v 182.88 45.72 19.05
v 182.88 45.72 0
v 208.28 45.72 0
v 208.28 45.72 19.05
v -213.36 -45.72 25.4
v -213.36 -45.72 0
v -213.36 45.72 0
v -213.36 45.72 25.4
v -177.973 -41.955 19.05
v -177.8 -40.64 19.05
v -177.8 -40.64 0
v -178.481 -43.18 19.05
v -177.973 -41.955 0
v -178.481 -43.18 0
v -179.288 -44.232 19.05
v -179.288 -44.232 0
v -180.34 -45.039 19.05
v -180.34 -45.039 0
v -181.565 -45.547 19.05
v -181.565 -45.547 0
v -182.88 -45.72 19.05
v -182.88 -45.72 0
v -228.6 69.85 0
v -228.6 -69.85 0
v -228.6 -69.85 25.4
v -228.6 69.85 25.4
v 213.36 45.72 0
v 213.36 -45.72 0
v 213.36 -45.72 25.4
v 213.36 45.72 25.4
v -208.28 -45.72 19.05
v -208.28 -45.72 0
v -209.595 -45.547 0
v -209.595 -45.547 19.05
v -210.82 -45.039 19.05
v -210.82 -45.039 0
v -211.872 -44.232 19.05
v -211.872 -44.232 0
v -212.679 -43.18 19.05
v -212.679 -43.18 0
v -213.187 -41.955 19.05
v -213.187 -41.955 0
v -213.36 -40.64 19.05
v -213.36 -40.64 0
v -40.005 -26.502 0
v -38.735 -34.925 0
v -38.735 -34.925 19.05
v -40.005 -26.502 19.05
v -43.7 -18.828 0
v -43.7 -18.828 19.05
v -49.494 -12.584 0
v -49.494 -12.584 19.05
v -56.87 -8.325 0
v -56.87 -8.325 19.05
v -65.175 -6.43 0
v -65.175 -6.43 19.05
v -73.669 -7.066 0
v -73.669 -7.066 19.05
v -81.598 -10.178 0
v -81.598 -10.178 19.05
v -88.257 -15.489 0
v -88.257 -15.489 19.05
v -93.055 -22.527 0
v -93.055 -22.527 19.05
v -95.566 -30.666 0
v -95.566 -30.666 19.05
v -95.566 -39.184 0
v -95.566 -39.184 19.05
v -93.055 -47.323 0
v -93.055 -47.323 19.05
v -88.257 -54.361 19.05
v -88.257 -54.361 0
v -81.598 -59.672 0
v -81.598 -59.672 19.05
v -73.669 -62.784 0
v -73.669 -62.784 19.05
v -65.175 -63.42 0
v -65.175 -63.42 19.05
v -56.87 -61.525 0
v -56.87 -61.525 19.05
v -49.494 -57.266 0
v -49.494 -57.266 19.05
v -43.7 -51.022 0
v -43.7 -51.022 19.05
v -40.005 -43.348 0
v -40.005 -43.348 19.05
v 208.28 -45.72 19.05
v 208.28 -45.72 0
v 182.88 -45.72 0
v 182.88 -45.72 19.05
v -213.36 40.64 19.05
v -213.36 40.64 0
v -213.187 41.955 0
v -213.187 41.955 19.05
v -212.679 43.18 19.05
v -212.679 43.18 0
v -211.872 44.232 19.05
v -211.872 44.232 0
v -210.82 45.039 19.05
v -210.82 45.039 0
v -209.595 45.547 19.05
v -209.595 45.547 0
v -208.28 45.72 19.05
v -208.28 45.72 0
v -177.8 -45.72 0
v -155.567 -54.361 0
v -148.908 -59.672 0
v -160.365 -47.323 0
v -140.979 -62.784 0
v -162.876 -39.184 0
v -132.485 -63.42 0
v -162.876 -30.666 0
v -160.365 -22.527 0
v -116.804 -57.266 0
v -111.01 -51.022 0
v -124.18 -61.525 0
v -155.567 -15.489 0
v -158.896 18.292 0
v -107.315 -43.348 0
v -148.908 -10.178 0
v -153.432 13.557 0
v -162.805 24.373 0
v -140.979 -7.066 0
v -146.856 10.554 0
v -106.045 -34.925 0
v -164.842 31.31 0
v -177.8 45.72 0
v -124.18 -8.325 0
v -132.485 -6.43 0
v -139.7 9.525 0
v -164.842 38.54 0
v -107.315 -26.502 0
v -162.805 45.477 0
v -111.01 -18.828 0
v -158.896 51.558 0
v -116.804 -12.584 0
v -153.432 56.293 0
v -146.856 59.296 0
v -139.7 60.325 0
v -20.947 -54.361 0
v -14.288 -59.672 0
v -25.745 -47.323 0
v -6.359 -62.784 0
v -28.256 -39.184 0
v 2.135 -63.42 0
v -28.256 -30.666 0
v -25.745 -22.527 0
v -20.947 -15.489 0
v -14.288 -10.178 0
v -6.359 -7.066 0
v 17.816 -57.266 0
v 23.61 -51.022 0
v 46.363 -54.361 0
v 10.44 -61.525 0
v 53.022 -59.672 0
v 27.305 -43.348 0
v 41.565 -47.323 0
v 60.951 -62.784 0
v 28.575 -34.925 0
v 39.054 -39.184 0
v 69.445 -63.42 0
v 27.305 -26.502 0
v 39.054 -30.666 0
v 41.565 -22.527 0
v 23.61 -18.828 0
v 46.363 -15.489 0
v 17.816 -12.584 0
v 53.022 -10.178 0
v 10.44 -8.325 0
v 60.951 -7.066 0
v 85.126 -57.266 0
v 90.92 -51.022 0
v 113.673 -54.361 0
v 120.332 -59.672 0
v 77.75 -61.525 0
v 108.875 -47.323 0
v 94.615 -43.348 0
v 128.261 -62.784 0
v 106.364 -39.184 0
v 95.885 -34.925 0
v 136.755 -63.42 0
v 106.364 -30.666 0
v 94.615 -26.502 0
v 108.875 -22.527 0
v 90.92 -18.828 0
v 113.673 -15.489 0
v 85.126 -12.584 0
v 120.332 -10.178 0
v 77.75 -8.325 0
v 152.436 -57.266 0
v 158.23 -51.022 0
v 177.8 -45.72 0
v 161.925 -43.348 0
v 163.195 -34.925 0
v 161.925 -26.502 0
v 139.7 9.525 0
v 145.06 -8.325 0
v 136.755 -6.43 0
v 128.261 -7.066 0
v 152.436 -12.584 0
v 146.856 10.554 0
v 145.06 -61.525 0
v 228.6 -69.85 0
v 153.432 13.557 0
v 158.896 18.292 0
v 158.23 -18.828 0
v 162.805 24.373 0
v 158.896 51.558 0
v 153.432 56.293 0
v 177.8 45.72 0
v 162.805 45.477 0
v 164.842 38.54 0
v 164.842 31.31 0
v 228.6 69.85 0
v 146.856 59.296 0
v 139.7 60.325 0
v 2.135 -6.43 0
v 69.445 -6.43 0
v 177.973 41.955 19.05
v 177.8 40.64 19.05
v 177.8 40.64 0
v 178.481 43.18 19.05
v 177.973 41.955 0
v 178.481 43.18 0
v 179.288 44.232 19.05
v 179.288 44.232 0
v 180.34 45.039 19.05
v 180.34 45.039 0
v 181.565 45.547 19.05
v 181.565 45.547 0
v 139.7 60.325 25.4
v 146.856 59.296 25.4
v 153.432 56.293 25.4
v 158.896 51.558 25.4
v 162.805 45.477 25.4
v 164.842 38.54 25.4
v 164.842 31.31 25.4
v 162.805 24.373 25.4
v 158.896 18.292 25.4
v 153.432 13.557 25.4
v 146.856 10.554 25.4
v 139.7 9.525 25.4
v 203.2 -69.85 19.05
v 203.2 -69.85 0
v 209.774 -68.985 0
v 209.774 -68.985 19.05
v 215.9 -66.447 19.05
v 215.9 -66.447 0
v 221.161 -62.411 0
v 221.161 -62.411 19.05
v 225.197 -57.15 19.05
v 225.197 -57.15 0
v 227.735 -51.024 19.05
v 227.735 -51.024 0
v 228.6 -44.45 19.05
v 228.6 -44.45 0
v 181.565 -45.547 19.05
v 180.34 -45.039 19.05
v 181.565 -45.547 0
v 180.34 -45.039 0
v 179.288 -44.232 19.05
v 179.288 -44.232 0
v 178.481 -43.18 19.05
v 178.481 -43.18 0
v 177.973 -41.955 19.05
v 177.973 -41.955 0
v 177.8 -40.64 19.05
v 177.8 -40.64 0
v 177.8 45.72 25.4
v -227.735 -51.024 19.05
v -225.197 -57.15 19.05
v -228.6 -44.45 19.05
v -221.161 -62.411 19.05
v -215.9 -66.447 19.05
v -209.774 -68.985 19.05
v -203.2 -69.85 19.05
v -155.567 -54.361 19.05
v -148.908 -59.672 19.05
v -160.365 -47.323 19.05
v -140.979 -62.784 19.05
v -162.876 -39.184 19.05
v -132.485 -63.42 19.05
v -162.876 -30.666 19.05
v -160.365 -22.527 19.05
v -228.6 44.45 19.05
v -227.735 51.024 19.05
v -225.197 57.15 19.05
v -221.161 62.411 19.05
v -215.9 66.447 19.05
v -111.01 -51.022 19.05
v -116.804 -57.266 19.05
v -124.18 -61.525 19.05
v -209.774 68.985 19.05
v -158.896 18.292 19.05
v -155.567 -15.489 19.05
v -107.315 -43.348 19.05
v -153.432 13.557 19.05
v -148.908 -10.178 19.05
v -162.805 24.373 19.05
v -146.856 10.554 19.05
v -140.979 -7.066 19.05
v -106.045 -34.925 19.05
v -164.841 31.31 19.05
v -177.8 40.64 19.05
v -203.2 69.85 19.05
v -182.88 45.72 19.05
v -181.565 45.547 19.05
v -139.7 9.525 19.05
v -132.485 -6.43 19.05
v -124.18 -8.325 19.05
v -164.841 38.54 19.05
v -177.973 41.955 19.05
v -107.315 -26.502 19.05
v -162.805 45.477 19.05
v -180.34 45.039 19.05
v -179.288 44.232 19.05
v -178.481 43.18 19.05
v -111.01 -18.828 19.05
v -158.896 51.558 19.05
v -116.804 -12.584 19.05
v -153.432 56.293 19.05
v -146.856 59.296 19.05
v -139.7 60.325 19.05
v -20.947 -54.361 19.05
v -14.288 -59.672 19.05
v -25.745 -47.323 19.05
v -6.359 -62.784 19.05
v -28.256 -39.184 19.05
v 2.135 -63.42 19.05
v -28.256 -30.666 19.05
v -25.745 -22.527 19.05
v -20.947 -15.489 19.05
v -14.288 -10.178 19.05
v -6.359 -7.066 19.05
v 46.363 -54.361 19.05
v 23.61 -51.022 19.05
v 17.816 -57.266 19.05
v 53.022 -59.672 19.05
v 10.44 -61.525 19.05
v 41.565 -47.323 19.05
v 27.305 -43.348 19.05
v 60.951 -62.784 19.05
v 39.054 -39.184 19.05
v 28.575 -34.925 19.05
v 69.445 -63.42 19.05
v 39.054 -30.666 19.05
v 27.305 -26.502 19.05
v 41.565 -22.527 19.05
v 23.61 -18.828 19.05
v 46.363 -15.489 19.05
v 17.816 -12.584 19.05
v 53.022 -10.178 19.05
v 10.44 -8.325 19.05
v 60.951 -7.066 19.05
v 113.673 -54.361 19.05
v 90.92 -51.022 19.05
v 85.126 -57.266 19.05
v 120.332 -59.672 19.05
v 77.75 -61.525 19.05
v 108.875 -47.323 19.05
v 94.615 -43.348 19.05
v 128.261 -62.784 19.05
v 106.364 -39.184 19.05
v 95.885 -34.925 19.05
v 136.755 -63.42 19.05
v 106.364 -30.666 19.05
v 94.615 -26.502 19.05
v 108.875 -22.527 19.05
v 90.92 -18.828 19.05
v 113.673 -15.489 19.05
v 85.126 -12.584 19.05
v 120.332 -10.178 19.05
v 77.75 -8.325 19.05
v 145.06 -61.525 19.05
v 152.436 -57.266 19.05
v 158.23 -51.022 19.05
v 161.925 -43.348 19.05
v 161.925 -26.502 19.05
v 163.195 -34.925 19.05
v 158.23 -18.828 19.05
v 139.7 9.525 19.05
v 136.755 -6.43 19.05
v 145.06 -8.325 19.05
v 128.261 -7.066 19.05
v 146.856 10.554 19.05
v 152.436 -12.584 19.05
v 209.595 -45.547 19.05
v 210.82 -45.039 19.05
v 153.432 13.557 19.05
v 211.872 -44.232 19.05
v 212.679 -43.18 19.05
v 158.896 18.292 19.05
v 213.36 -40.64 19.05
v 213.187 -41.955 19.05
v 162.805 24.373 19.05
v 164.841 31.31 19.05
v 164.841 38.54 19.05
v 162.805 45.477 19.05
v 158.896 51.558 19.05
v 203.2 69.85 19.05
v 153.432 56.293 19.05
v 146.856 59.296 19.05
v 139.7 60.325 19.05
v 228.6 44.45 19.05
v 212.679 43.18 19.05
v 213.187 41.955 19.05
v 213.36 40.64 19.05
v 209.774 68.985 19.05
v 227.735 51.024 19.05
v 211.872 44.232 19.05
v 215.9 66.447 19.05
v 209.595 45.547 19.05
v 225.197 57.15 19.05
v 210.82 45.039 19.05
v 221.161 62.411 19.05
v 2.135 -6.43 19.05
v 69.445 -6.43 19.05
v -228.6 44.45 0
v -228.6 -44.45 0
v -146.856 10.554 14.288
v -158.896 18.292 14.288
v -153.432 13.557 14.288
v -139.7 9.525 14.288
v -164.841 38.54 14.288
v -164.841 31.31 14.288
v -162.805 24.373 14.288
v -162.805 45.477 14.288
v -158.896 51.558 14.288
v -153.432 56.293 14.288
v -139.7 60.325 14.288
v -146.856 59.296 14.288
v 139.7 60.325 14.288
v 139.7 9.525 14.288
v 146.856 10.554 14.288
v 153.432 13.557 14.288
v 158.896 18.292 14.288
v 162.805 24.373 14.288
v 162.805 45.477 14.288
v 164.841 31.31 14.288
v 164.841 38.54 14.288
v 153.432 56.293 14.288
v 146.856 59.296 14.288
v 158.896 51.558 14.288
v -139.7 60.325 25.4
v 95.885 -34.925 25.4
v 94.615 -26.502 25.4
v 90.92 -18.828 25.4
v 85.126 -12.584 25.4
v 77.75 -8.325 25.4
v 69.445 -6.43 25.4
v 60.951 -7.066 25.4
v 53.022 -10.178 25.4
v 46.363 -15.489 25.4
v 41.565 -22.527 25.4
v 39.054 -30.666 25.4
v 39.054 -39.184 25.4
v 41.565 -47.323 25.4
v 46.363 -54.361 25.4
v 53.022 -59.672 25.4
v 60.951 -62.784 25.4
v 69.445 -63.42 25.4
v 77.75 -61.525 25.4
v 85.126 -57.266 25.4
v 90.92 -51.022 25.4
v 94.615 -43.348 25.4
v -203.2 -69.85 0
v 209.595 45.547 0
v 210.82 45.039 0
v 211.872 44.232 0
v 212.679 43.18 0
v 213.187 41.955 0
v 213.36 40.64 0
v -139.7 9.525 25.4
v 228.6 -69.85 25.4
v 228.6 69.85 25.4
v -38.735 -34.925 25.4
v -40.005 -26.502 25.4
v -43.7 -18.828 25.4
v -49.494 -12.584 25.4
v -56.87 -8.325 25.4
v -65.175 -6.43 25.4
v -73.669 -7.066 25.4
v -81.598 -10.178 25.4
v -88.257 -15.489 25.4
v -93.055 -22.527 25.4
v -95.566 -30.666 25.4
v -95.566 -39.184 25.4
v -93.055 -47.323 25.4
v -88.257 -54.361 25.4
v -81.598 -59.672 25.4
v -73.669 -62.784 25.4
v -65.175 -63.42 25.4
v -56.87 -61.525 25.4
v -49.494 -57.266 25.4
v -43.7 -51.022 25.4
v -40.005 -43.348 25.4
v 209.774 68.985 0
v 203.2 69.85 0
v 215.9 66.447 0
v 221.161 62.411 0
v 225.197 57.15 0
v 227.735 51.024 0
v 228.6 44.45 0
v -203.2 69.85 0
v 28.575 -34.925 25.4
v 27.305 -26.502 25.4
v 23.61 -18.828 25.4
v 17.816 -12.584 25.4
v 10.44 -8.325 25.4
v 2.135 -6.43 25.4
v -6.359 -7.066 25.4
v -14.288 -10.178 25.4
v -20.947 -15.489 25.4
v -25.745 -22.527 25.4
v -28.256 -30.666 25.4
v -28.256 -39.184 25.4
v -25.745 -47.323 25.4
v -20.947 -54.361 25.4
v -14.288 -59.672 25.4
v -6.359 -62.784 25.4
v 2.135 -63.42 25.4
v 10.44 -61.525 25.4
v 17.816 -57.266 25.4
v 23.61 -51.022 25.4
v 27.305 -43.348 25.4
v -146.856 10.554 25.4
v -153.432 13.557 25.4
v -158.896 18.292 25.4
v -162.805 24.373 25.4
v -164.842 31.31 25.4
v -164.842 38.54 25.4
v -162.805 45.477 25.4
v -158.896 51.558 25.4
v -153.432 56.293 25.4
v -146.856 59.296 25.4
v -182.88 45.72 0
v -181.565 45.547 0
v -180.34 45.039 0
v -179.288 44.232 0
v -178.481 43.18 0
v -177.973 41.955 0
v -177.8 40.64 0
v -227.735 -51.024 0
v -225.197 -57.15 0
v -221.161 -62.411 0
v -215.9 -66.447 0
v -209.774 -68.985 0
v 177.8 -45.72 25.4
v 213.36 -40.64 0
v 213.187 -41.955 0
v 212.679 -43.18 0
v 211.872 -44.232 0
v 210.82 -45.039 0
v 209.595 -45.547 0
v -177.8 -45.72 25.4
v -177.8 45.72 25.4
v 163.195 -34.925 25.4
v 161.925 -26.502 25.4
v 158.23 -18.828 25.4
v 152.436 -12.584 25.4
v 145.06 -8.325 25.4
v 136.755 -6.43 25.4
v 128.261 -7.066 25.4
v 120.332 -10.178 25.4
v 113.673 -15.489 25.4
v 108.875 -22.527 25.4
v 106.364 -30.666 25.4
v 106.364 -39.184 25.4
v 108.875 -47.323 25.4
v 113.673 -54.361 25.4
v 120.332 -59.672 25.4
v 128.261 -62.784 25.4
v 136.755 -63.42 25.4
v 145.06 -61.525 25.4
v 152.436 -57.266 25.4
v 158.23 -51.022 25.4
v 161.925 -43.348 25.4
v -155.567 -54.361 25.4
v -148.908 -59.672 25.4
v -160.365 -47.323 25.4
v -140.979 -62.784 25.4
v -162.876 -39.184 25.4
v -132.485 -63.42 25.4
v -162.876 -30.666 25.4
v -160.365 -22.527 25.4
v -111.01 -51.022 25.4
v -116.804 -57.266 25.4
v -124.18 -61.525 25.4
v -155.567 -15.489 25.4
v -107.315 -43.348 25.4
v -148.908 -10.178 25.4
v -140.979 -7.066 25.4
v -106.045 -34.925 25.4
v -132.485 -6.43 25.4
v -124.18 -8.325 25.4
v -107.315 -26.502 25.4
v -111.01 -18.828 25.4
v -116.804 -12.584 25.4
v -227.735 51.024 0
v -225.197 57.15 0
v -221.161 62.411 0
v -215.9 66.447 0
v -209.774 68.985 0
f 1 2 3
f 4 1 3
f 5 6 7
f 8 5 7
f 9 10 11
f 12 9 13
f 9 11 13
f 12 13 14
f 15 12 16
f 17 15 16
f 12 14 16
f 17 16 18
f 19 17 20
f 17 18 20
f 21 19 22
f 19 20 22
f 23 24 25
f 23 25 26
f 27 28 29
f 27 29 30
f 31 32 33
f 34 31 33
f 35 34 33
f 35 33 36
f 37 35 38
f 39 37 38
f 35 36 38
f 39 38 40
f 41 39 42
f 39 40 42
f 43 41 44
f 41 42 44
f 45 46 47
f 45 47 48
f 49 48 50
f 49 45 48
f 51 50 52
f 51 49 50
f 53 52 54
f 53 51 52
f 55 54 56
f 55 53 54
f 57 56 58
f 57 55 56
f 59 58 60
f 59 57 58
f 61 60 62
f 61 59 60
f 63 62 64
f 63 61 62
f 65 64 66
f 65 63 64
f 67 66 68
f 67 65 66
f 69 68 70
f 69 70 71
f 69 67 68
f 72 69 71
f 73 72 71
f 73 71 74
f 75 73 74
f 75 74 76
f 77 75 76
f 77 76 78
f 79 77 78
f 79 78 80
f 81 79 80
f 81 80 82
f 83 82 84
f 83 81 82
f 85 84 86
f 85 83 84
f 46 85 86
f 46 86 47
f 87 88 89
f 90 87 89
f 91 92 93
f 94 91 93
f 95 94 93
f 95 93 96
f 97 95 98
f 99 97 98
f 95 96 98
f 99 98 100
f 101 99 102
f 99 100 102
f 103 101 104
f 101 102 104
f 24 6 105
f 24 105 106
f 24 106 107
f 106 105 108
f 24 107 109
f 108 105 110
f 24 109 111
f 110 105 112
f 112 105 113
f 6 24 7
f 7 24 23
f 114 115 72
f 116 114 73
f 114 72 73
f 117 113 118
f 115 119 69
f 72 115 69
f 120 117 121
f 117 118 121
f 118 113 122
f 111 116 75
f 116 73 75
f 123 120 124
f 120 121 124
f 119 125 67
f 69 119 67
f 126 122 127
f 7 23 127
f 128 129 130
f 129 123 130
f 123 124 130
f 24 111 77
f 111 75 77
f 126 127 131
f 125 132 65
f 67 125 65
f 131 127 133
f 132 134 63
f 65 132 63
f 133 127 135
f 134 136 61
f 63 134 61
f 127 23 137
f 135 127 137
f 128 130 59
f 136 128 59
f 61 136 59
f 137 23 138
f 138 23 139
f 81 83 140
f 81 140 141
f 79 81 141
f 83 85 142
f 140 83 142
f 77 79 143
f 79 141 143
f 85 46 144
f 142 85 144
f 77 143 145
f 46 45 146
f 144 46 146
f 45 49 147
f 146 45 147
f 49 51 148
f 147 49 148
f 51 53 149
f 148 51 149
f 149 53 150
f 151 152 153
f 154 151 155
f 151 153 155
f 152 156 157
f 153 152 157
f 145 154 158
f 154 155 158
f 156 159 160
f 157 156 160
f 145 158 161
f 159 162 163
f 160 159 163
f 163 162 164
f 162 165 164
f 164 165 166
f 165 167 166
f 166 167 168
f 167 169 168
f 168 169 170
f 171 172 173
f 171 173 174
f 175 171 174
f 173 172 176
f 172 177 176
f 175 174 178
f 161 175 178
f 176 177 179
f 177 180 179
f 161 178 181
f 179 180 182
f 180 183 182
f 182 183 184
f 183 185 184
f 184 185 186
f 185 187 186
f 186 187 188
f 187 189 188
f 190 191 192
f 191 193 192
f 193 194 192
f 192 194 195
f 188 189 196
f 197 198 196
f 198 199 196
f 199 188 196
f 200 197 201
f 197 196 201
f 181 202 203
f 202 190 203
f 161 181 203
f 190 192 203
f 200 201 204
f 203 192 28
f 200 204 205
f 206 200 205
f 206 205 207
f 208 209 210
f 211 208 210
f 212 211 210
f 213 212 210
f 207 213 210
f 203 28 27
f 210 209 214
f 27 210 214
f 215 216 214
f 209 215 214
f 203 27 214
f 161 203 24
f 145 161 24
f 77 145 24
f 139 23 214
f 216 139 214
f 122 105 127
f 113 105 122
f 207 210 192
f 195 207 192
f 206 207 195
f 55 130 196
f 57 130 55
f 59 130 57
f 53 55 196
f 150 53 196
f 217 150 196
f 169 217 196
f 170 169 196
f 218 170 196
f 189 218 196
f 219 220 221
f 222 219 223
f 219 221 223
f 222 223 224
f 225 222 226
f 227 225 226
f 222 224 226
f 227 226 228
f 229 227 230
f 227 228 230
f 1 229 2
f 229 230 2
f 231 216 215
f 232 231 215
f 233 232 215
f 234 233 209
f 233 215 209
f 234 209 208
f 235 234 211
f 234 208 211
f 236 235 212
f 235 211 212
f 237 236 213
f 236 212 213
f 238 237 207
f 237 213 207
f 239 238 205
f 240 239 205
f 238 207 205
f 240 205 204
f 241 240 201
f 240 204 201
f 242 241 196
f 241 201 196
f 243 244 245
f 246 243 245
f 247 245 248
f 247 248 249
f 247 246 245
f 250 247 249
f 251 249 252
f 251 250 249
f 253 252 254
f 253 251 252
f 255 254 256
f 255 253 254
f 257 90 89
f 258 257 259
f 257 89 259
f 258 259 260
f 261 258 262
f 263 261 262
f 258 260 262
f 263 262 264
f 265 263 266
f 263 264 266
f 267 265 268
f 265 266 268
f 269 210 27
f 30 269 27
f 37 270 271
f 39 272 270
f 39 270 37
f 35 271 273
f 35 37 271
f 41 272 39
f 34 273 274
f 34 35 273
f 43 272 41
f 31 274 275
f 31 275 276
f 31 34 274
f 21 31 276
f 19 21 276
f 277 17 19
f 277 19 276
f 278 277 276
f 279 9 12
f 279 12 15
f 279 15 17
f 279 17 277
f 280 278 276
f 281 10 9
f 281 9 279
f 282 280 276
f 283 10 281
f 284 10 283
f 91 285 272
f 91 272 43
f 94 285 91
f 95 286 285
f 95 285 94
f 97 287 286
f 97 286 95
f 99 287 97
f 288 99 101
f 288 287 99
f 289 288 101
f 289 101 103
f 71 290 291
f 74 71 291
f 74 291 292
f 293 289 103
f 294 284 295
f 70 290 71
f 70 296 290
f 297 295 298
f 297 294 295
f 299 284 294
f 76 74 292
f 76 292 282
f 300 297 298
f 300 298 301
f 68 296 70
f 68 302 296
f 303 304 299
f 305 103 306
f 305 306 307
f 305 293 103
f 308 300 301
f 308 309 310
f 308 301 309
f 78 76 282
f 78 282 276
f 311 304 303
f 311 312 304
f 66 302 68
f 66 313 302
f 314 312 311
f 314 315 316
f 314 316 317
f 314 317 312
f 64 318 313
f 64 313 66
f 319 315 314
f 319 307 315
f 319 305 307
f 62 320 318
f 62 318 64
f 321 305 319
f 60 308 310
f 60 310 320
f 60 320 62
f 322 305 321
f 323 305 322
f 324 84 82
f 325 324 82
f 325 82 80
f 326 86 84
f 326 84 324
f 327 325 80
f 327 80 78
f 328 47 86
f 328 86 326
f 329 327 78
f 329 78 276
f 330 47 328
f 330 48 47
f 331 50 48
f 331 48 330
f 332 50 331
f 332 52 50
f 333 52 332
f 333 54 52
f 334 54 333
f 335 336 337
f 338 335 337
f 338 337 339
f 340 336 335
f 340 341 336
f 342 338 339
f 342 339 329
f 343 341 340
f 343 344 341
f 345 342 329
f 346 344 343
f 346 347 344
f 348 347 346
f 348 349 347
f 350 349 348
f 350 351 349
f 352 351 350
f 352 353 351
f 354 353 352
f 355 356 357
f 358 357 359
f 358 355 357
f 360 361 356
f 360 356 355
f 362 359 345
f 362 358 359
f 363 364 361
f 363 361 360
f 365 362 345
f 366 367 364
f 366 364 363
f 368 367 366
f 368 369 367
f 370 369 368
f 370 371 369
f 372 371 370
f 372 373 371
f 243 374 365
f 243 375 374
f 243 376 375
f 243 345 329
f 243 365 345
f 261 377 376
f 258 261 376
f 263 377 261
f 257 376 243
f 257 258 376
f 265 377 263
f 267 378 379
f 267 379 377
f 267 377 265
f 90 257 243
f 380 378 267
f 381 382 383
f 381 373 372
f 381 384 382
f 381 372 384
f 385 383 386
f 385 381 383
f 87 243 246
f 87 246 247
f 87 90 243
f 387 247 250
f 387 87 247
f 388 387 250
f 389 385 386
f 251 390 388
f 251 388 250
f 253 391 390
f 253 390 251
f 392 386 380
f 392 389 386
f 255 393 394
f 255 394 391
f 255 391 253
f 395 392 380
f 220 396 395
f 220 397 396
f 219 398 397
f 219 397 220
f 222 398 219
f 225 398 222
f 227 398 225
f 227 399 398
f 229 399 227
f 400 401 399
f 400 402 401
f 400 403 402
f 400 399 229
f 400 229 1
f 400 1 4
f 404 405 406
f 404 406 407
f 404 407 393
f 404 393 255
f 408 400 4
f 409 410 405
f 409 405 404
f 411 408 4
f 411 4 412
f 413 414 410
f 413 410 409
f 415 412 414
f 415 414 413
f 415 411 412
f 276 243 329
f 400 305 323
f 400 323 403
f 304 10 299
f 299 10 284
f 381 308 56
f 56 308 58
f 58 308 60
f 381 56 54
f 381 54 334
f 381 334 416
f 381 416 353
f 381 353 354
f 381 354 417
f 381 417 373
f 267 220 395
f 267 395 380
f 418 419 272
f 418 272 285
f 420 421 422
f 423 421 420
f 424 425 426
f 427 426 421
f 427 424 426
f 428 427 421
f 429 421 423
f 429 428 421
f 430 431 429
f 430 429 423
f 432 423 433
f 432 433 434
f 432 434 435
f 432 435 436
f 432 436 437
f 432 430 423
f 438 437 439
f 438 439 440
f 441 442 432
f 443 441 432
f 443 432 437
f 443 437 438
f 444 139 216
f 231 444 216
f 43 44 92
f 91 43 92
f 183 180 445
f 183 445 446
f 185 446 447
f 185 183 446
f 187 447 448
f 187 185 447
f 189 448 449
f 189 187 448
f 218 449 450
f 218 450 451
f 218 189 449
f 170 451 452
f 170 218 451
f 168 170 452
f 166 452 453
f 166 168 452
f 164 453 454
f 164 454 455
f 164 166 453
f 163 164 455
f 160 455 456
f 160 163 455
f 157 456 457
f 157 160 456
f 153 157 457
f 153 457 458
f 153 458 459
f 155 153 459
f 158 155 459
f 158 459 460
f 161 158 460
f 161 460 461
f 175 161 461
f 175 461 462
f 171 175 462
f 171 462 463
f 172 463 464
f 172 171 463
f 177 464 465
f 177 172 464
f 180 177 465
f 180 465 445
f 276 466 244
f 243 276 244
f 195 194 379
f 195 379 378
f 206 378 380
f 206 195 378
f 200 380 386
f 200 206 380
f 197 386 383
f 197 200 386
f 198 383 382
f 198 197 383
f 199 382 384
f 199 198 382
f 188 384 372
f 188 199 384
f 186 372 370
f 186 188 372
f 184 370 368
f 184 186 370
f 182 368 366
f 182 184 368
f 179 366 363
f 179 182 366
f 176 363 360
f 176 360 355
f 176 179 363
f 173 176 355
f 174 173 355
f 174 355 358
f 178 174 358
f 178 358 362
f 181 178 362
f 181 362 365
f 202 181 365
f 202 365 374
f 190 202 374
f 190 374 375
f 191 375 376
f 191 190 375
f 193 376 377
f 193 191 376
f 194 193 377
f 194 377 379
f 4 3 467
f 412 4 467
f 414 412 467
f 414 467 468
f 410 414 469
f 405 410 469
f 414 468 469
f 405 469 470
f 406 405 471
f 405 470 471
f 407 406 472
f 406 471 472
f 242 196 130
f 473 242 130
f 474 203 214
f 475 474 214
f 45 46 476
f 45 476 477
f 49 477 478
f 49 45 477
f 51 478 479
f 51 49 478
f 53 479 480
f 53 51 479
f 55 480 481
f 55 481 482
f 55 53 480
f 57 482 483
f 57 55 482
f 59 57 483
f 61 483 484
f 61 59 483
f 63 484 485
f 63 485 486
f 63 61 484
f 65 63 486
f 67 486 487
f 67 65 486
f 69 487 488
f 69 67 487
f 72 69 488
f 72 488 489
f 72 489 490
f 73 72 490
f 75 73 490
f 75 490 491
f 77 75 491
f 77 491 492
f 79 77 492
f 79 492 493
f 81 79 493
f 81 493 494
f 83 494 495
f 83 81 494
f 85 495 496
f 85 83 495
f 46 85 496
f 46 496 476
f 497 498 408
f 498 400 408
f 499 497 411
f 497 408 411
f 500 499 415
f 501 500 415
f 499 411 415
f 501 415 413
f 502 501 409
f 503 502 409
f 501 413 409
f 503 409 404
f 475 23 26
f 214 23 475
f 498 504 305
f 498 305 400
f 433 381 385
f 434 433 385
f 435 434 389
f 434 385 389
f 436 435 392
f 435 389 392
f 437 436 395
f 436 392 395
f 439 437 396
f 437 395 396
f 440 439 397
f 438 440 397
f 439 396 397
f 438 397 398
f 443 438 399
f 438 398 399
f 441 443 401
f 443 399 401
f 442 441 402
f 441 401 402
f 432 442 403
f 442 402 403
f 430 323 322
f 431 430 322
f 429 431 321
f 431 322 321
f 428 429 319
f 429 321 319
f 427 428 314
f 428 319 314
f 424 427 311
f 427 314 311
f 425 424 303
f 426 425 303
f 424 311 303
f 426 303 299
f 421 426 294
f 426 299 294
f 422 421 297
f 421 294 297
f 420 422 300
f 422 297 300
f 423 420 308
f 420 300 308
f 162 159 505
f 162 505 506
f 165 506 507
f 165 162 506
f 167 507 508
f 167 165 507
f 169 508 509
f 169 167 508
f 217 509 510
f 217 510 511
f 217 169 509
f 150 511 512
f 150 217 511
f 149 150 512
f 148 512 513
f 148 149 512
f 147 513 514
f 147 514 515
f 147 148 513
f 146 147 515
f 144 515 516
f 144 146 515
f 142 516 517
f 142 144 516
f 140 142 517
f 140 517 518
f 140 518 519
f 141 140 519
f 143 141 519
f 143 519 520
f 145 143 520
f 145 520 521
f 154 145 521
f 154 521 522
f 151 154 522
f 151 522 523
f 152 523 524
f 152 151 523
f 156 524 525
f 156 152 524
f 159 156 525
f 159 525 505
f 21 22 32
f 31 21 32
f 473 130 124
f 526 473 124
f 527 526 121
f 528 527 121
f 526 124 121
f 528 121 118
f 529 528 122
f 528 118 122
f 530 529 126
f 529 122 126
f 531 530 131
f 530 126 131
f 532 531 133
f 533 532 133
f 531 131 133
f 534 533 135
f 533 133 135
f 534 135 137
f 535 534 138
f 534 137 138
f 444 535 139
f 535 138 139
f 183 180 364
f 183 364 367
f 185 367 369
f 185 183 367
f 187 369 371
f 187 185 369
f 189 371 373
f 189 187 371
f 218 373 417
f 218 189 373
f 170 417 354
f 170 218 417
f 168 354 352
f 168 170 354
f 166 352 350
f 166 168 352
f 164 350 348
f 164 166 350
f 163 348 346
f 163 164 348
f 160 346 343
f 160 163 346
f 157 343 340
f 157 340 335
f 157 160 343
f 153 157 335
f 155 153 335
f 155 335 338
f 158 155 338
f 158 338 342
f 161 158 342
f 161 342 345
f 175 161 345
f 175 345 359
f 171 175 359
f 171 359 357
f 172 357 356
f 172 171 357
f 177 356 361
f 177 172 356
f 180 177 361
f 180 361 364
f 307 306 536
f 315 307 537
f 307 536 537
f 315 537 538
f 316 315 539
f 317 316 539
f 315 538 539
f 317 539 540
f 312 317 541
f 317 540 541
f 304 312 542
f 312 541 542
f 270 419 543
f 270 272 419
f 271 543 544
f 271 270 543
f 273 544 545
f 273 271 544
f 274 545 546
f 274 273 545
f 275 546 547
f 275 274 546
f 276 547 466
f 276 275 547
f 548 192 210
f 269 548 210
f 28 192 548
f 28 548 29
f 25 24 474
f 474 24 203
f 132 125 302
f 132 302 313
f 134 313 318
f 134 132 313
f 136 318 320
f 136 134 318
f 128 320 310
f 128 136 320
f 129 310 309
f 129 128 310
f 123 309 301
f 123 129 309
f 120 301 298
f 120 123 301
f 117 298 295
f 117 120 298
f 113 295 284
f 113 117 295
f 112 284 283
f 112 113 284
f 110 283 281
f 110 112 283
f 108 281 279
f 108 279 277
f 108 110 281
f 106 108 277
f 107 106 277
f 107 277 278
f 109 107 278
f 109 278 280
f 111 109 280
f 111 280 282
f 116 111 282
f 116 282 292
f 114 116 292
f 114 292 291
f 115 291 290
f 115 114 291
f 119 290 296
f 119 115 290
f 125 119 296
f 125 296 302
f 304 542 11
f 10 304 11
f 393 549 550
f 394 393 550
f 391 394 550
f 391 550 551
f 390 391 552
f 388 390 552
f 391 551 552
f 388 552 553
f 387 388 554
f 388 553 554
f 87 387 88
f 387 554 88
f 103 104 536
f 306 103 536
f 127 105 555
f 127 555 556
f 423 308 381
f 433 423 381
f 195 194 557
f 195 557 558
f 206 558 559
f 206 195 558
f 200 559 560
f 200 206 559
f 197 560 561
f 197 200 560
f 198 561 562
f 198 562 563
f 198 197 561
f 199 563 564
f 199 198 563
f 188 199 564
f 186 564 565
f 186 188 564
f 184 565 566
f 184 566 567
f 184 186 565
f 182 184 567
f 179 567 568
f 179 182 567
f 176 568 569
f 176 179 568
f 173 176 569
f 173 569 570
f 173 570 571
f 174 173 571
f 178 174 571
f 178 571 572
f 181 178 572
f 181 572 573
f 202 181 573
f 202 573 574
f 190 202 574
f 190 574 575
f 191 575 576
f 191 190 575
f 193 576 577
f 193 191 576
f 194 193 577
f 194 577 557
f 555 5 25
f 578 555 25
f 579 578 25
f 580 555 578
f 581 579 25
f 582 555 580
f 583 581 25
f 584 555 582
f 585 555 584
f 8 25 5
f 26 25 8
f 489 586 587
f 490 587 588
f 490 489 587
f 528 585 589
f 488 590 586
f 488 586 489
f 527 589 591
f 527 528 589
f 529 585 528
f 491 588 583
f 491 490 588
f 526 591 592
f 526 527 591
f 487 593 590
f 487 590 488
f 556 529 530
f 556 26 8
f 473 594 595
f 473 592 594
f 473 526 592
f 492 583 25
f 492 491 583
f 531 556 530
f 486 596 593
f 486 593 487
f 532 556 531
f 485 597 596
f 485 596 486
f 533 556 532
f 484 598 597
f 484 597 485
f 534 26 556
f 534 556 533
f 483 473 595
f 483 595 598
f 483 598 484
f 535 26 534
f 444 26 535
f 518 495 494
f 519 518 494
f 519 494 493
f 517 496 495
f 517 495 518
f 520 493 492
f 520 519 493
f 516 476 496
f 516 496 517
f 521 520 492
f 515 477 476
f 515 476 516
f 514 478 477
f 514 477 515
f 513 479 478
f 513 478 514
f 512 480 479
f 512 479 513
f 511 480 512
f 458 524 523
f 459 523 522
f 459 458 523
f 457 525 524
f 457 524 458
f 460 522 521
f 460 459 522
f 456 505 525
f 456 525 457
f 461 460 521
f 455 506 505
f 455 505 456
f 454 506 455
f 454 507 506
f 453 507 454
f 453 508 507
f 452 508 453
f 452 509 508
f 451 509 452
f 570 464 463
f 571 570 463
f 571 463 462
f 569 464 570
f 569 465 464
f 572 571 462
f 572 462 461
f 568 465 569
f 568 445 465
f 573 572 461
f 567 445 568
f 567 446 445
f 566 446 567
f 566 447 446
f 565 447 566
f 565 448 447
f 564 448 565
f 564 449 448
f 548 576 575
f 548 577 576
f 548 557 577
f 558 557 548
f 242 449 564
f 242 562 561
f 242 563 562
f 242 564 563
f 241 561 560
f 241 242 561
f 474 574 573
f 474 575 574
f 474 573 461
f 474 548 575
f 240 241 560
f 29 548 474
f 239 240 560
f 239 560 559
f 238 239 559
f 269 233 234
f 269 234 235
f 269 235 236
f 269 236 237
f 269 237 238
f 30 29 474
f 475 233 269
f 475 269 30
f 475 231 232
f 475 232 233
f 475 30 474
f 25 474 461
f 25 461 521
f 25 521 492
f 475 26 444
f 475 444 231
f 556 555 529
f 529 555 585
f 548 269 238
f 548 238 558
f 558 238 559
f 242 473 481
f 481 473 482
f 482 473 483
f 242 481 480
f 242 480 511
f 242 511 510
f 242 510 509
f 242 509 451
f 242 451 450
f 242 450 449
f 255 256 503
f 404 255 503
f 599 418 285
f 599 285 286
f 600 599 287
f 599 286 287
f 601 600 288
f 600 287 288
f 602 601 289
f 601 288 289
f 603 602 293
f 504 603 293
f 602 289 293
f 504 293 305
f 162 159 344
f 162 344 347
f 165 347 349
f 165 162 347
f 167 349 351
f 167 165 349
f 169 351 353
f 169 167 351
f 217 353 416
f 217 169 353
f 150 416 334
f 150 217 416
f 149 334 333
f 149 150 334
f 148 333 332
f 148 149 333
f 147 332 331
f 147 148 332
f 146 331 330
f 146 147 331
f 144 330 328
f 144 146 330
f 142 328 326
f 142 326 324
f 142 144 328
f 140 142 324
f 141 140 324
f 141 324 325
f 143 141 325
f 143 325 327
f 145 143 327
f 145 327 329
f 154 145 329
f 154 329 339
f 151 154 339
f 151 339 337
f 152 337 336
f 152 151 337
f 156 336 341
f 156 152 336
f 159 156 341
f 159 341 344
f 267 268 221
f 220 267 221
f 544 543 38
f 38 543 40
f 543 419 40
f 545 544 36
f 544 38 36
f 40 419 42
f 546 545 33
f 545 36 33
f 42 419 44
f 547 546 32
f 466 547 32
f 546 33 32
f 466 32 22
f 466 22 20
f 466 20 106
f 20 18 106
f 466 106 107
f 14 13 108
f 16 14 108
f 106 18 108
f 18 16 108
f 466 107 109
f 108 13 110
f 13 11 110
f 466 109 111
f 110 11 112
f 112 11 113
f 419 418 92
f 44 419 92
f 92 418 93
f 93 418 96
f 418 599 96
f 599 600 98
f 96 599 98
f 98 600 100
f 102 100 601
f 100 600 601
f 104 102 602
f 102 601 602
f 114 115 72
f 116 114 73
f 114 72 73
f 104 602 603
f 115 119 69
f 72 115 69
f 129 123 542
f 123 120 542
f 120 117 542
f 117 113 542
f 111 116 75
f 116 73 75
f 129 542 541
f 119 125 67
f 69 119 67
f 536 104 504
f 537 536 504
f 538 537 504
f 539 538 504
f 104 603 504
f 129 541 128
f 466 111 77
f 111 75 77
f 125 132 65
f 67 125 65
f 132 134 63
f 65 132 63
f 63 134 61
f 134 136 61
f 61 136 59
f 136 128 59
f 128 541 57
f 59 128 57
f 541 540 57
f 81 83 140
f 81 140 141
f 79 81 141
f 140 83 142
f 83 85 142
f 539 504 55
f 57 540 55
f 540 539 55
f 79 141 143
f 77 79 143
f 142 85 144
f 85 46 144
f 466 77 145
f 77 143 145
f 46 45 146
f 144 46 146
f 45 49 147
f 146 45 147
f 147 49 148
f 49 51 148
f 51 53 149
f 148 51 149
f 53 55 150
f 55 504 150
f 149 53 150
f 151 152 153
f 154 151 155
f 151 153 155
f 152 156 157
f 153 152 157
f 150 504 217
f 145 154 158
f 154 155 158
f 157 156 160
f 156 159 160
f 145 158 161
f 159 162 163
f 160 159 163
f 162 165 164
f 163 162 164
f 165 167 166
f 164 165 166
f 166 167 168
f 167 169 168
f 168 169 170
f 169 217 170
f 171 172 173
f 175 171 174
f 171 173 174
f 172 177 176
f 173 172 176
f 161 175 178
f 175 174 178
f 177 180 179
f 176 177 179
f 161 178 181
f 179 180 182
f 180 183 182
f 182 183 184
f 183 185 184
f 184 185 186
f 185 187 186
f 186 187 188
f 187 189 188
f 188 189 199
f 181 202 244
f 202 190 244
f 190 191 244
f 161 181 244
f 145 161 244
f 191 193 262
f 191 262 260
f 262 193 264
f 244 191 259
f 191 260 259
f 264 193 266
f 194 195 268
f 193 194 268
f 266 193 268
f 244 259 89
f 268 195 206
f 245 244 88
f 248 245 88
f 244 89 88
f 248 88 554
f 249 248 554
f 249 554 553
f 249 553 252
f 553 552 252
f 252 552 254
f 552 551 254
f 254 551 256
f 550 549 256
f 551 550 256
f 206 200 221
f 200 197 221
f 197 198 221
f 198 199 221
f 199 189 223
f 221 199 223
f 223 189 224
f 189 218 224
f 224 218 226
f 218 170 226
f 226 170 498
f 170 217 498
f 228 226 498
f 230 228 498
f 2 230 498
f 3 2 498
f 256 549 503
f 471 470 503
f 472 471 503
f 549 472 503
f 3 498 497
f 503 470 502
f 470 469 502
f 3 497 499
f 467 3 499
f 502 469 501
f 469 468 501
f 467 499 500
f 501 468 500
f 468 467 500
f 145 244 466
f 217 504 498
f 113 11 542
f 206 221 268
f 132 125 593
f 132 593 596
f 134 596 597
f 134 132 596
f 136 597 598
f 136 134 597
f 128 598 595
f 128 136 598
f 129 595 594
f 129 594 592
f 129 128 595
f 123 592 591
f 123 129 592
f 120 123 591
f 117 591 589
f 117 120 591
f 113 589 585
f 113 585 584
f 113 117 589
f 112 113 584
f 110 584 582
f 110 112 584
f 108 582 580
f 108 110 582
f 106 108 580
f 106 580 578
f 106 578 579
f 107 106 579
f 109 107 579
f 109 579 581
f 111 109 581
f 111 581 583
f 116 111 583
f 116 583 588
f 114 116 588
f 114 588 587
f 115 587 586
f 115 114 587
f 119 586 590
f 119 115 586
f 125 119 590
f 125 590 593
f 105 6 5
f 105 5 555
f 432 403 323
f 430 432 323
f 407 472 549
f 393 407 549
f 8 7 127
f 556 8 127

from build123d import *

# Parameters (mm, degrees)
F0_W     = 457.2
F0_H     = 139.7
F0_R     = 28.575
F0_W_2   = 35.56
F0_H_2   = 91.44
F1_DEPTH = 25.4
F2_W     = 457.2
F2_H     = 139.7
F2_R     = 28.575
F3_DEPTH = 19.05
F5_DEPTH = 4.7625
F6_R     = 25.4


with BuildPart() as f1:
    # F0 (on Top) → F1 (new body)
    with BuildSketch(Plane.XY):
        Rectangle(F0_W, F0_H)
        with Locations((-134.62, -34.925)):
            Circle(F0_R, mode=Mode.SUBTRACT)
        with Locations((-67.31, -34.925)):
            Circle(F0_R, mode=Mode.SUBTRACT)
        with Locations((0, -34.925)):
            Circle(F0_R, mode=Mode.SUBTRACT)
        with Locations((67.31, -34.925)):
            Circle(F0_R, mode=Mode.SUBTRACT)
        with Locations((134.62, -34.925)):
            Circle(F0_R, mode=Mode.SUBTRACT)
        with Locations((-195.58, 0)):
            Rectangle(F0_W_2, F0_H_2, mode=Mode.SUBTRACT)
        with Locations((195.58, 0)):
            Rectangle(F0_W_2, F0_H_2, mode=Mode.SUBTRACT)
        with BuildLine():
            ThreePointArc((139.7, 60.325), (165.100056, 34.9250275), (139.700055, 9.525))
            Line((139.700055, 9.525), (-139.700054, 9.525))
            ThreePointArc((-139.700054, 9.525), (-165.100056, 34.925027), (-139.7, 60.325))
            Line((-139.7, 60.325), (139.7, 60.325))
        make_face(mode=Mode.SUBTRACT)
    extrude(amount=F1_DEPTH)


with BuildPart() as f3:
    # F2 (on Top) → F3 (new body)
    with BuildSketch(Plane.XY):
        Rectangle(F2_W, F2_H)
        with Locations((-134.62, -34.925)):
            Circle(F2_R, mode=Mode.SUBTRACT)
        with Locations((-67.31, -34.925)):
            Circle(F2_R, mode=Mode.SUBTRACT)
        with Locations((0, -34.925)):
            Circle(F2_R, mode=Mode.SUBTRACT)
        with Locations((67.31, -34.925)):
            Circle(F2_R, mode=Mode.SUBTRACT)
        with Locations((134.62, -34.925)):
            Circle(F2_R, mode=Mode.SUBTRACT)
        with BuildLine():
            ThreePointArc((-177.8, -40.64), (-179.2878975516, -44.2321024484), (-182.88, -45.72))
            Line((-182.88, -45.72), (-208.28, -45.72))
            ThreePointArc((-208.28, -45.72), (-211.8721024484, -44.2321024484), (-213.36, -40.64))
            Line((-213.36, -40.64), (-213.36, 40.64))
            ThreePointArc((-213.36, 40.64), (-211.8721024484, 44.2321024484), (-208.28, 45.72))
            Line((-208.28, 45.72), (-182.88, 45.72))
            ThreePointArc((-182.88, 45.72), (-179.2878975516, 44.2321024484), (-177.8, 40.64))
            Line((-177.8, 40.64), (-177.8, -40.64))
        make_face(mode=Mode.SUBTRACT)
        with BuildLine():
            ThreePointArc((182.88, -45.72), (179.2878975516, -44.2321024484), (177.8, -40.64))
            Line((177.8, -40.64), (177.8, 40.64))
            ThreePointArc((177.8, 40.64), (179.2878975516, 44.2321024484), (182.88, 45.72))
            Line((182.88, 45.72), (208.28, 45.72))
            ThreePointArc((208.28, 45.72), (211.8721024484, 44.2321024484), (213.36, 40.64))
            Line((213.36, 40.64), (213.36, -40.64))
            ThreePointArc((213.36, -40.64), (211.8721024484, -44.2321024484), (208.28, -45.72))
            Line((208.28, -45.72), (182.88, -45.72))
        make_face(mode=Mode.SUBTRACT)
    extrude(amount=F3_DEPTH)

    # F4 (on face) → F5 (cut)
    with BuildSketch(Plane.XY.offset(19.05)):
        with BuildLine():
            ThreePointArc((-139.7, 60.325), (-165.1, 34.925), (-139.7, 9.525))
            Line((-139.7, 9.525), (139.7, 9.525))
            ThreePointArc((139.7, 9.525), (165.1, 34.925), (139.7, 60.325))
            Line((139.7, 60.325), (-139.7, 60.325))
        make_face()
    extrude(amount=-F5_DEPTH, mode=Mode.SUBTRACT)

    # F6
    f6_edges = [f3.edges().sort_by_distance(p)[0] for p in [
        (228.6, -69.85, 9.525),
        (228.6, 69.85, 9.525),
        (-228.6, -69.85, 9.525),
        (-228.6, 69.85, 9.525),
    ]]
    fillet(f6_edges, radius=F6_R)


solid = Compound([f1.part, f3.part])
